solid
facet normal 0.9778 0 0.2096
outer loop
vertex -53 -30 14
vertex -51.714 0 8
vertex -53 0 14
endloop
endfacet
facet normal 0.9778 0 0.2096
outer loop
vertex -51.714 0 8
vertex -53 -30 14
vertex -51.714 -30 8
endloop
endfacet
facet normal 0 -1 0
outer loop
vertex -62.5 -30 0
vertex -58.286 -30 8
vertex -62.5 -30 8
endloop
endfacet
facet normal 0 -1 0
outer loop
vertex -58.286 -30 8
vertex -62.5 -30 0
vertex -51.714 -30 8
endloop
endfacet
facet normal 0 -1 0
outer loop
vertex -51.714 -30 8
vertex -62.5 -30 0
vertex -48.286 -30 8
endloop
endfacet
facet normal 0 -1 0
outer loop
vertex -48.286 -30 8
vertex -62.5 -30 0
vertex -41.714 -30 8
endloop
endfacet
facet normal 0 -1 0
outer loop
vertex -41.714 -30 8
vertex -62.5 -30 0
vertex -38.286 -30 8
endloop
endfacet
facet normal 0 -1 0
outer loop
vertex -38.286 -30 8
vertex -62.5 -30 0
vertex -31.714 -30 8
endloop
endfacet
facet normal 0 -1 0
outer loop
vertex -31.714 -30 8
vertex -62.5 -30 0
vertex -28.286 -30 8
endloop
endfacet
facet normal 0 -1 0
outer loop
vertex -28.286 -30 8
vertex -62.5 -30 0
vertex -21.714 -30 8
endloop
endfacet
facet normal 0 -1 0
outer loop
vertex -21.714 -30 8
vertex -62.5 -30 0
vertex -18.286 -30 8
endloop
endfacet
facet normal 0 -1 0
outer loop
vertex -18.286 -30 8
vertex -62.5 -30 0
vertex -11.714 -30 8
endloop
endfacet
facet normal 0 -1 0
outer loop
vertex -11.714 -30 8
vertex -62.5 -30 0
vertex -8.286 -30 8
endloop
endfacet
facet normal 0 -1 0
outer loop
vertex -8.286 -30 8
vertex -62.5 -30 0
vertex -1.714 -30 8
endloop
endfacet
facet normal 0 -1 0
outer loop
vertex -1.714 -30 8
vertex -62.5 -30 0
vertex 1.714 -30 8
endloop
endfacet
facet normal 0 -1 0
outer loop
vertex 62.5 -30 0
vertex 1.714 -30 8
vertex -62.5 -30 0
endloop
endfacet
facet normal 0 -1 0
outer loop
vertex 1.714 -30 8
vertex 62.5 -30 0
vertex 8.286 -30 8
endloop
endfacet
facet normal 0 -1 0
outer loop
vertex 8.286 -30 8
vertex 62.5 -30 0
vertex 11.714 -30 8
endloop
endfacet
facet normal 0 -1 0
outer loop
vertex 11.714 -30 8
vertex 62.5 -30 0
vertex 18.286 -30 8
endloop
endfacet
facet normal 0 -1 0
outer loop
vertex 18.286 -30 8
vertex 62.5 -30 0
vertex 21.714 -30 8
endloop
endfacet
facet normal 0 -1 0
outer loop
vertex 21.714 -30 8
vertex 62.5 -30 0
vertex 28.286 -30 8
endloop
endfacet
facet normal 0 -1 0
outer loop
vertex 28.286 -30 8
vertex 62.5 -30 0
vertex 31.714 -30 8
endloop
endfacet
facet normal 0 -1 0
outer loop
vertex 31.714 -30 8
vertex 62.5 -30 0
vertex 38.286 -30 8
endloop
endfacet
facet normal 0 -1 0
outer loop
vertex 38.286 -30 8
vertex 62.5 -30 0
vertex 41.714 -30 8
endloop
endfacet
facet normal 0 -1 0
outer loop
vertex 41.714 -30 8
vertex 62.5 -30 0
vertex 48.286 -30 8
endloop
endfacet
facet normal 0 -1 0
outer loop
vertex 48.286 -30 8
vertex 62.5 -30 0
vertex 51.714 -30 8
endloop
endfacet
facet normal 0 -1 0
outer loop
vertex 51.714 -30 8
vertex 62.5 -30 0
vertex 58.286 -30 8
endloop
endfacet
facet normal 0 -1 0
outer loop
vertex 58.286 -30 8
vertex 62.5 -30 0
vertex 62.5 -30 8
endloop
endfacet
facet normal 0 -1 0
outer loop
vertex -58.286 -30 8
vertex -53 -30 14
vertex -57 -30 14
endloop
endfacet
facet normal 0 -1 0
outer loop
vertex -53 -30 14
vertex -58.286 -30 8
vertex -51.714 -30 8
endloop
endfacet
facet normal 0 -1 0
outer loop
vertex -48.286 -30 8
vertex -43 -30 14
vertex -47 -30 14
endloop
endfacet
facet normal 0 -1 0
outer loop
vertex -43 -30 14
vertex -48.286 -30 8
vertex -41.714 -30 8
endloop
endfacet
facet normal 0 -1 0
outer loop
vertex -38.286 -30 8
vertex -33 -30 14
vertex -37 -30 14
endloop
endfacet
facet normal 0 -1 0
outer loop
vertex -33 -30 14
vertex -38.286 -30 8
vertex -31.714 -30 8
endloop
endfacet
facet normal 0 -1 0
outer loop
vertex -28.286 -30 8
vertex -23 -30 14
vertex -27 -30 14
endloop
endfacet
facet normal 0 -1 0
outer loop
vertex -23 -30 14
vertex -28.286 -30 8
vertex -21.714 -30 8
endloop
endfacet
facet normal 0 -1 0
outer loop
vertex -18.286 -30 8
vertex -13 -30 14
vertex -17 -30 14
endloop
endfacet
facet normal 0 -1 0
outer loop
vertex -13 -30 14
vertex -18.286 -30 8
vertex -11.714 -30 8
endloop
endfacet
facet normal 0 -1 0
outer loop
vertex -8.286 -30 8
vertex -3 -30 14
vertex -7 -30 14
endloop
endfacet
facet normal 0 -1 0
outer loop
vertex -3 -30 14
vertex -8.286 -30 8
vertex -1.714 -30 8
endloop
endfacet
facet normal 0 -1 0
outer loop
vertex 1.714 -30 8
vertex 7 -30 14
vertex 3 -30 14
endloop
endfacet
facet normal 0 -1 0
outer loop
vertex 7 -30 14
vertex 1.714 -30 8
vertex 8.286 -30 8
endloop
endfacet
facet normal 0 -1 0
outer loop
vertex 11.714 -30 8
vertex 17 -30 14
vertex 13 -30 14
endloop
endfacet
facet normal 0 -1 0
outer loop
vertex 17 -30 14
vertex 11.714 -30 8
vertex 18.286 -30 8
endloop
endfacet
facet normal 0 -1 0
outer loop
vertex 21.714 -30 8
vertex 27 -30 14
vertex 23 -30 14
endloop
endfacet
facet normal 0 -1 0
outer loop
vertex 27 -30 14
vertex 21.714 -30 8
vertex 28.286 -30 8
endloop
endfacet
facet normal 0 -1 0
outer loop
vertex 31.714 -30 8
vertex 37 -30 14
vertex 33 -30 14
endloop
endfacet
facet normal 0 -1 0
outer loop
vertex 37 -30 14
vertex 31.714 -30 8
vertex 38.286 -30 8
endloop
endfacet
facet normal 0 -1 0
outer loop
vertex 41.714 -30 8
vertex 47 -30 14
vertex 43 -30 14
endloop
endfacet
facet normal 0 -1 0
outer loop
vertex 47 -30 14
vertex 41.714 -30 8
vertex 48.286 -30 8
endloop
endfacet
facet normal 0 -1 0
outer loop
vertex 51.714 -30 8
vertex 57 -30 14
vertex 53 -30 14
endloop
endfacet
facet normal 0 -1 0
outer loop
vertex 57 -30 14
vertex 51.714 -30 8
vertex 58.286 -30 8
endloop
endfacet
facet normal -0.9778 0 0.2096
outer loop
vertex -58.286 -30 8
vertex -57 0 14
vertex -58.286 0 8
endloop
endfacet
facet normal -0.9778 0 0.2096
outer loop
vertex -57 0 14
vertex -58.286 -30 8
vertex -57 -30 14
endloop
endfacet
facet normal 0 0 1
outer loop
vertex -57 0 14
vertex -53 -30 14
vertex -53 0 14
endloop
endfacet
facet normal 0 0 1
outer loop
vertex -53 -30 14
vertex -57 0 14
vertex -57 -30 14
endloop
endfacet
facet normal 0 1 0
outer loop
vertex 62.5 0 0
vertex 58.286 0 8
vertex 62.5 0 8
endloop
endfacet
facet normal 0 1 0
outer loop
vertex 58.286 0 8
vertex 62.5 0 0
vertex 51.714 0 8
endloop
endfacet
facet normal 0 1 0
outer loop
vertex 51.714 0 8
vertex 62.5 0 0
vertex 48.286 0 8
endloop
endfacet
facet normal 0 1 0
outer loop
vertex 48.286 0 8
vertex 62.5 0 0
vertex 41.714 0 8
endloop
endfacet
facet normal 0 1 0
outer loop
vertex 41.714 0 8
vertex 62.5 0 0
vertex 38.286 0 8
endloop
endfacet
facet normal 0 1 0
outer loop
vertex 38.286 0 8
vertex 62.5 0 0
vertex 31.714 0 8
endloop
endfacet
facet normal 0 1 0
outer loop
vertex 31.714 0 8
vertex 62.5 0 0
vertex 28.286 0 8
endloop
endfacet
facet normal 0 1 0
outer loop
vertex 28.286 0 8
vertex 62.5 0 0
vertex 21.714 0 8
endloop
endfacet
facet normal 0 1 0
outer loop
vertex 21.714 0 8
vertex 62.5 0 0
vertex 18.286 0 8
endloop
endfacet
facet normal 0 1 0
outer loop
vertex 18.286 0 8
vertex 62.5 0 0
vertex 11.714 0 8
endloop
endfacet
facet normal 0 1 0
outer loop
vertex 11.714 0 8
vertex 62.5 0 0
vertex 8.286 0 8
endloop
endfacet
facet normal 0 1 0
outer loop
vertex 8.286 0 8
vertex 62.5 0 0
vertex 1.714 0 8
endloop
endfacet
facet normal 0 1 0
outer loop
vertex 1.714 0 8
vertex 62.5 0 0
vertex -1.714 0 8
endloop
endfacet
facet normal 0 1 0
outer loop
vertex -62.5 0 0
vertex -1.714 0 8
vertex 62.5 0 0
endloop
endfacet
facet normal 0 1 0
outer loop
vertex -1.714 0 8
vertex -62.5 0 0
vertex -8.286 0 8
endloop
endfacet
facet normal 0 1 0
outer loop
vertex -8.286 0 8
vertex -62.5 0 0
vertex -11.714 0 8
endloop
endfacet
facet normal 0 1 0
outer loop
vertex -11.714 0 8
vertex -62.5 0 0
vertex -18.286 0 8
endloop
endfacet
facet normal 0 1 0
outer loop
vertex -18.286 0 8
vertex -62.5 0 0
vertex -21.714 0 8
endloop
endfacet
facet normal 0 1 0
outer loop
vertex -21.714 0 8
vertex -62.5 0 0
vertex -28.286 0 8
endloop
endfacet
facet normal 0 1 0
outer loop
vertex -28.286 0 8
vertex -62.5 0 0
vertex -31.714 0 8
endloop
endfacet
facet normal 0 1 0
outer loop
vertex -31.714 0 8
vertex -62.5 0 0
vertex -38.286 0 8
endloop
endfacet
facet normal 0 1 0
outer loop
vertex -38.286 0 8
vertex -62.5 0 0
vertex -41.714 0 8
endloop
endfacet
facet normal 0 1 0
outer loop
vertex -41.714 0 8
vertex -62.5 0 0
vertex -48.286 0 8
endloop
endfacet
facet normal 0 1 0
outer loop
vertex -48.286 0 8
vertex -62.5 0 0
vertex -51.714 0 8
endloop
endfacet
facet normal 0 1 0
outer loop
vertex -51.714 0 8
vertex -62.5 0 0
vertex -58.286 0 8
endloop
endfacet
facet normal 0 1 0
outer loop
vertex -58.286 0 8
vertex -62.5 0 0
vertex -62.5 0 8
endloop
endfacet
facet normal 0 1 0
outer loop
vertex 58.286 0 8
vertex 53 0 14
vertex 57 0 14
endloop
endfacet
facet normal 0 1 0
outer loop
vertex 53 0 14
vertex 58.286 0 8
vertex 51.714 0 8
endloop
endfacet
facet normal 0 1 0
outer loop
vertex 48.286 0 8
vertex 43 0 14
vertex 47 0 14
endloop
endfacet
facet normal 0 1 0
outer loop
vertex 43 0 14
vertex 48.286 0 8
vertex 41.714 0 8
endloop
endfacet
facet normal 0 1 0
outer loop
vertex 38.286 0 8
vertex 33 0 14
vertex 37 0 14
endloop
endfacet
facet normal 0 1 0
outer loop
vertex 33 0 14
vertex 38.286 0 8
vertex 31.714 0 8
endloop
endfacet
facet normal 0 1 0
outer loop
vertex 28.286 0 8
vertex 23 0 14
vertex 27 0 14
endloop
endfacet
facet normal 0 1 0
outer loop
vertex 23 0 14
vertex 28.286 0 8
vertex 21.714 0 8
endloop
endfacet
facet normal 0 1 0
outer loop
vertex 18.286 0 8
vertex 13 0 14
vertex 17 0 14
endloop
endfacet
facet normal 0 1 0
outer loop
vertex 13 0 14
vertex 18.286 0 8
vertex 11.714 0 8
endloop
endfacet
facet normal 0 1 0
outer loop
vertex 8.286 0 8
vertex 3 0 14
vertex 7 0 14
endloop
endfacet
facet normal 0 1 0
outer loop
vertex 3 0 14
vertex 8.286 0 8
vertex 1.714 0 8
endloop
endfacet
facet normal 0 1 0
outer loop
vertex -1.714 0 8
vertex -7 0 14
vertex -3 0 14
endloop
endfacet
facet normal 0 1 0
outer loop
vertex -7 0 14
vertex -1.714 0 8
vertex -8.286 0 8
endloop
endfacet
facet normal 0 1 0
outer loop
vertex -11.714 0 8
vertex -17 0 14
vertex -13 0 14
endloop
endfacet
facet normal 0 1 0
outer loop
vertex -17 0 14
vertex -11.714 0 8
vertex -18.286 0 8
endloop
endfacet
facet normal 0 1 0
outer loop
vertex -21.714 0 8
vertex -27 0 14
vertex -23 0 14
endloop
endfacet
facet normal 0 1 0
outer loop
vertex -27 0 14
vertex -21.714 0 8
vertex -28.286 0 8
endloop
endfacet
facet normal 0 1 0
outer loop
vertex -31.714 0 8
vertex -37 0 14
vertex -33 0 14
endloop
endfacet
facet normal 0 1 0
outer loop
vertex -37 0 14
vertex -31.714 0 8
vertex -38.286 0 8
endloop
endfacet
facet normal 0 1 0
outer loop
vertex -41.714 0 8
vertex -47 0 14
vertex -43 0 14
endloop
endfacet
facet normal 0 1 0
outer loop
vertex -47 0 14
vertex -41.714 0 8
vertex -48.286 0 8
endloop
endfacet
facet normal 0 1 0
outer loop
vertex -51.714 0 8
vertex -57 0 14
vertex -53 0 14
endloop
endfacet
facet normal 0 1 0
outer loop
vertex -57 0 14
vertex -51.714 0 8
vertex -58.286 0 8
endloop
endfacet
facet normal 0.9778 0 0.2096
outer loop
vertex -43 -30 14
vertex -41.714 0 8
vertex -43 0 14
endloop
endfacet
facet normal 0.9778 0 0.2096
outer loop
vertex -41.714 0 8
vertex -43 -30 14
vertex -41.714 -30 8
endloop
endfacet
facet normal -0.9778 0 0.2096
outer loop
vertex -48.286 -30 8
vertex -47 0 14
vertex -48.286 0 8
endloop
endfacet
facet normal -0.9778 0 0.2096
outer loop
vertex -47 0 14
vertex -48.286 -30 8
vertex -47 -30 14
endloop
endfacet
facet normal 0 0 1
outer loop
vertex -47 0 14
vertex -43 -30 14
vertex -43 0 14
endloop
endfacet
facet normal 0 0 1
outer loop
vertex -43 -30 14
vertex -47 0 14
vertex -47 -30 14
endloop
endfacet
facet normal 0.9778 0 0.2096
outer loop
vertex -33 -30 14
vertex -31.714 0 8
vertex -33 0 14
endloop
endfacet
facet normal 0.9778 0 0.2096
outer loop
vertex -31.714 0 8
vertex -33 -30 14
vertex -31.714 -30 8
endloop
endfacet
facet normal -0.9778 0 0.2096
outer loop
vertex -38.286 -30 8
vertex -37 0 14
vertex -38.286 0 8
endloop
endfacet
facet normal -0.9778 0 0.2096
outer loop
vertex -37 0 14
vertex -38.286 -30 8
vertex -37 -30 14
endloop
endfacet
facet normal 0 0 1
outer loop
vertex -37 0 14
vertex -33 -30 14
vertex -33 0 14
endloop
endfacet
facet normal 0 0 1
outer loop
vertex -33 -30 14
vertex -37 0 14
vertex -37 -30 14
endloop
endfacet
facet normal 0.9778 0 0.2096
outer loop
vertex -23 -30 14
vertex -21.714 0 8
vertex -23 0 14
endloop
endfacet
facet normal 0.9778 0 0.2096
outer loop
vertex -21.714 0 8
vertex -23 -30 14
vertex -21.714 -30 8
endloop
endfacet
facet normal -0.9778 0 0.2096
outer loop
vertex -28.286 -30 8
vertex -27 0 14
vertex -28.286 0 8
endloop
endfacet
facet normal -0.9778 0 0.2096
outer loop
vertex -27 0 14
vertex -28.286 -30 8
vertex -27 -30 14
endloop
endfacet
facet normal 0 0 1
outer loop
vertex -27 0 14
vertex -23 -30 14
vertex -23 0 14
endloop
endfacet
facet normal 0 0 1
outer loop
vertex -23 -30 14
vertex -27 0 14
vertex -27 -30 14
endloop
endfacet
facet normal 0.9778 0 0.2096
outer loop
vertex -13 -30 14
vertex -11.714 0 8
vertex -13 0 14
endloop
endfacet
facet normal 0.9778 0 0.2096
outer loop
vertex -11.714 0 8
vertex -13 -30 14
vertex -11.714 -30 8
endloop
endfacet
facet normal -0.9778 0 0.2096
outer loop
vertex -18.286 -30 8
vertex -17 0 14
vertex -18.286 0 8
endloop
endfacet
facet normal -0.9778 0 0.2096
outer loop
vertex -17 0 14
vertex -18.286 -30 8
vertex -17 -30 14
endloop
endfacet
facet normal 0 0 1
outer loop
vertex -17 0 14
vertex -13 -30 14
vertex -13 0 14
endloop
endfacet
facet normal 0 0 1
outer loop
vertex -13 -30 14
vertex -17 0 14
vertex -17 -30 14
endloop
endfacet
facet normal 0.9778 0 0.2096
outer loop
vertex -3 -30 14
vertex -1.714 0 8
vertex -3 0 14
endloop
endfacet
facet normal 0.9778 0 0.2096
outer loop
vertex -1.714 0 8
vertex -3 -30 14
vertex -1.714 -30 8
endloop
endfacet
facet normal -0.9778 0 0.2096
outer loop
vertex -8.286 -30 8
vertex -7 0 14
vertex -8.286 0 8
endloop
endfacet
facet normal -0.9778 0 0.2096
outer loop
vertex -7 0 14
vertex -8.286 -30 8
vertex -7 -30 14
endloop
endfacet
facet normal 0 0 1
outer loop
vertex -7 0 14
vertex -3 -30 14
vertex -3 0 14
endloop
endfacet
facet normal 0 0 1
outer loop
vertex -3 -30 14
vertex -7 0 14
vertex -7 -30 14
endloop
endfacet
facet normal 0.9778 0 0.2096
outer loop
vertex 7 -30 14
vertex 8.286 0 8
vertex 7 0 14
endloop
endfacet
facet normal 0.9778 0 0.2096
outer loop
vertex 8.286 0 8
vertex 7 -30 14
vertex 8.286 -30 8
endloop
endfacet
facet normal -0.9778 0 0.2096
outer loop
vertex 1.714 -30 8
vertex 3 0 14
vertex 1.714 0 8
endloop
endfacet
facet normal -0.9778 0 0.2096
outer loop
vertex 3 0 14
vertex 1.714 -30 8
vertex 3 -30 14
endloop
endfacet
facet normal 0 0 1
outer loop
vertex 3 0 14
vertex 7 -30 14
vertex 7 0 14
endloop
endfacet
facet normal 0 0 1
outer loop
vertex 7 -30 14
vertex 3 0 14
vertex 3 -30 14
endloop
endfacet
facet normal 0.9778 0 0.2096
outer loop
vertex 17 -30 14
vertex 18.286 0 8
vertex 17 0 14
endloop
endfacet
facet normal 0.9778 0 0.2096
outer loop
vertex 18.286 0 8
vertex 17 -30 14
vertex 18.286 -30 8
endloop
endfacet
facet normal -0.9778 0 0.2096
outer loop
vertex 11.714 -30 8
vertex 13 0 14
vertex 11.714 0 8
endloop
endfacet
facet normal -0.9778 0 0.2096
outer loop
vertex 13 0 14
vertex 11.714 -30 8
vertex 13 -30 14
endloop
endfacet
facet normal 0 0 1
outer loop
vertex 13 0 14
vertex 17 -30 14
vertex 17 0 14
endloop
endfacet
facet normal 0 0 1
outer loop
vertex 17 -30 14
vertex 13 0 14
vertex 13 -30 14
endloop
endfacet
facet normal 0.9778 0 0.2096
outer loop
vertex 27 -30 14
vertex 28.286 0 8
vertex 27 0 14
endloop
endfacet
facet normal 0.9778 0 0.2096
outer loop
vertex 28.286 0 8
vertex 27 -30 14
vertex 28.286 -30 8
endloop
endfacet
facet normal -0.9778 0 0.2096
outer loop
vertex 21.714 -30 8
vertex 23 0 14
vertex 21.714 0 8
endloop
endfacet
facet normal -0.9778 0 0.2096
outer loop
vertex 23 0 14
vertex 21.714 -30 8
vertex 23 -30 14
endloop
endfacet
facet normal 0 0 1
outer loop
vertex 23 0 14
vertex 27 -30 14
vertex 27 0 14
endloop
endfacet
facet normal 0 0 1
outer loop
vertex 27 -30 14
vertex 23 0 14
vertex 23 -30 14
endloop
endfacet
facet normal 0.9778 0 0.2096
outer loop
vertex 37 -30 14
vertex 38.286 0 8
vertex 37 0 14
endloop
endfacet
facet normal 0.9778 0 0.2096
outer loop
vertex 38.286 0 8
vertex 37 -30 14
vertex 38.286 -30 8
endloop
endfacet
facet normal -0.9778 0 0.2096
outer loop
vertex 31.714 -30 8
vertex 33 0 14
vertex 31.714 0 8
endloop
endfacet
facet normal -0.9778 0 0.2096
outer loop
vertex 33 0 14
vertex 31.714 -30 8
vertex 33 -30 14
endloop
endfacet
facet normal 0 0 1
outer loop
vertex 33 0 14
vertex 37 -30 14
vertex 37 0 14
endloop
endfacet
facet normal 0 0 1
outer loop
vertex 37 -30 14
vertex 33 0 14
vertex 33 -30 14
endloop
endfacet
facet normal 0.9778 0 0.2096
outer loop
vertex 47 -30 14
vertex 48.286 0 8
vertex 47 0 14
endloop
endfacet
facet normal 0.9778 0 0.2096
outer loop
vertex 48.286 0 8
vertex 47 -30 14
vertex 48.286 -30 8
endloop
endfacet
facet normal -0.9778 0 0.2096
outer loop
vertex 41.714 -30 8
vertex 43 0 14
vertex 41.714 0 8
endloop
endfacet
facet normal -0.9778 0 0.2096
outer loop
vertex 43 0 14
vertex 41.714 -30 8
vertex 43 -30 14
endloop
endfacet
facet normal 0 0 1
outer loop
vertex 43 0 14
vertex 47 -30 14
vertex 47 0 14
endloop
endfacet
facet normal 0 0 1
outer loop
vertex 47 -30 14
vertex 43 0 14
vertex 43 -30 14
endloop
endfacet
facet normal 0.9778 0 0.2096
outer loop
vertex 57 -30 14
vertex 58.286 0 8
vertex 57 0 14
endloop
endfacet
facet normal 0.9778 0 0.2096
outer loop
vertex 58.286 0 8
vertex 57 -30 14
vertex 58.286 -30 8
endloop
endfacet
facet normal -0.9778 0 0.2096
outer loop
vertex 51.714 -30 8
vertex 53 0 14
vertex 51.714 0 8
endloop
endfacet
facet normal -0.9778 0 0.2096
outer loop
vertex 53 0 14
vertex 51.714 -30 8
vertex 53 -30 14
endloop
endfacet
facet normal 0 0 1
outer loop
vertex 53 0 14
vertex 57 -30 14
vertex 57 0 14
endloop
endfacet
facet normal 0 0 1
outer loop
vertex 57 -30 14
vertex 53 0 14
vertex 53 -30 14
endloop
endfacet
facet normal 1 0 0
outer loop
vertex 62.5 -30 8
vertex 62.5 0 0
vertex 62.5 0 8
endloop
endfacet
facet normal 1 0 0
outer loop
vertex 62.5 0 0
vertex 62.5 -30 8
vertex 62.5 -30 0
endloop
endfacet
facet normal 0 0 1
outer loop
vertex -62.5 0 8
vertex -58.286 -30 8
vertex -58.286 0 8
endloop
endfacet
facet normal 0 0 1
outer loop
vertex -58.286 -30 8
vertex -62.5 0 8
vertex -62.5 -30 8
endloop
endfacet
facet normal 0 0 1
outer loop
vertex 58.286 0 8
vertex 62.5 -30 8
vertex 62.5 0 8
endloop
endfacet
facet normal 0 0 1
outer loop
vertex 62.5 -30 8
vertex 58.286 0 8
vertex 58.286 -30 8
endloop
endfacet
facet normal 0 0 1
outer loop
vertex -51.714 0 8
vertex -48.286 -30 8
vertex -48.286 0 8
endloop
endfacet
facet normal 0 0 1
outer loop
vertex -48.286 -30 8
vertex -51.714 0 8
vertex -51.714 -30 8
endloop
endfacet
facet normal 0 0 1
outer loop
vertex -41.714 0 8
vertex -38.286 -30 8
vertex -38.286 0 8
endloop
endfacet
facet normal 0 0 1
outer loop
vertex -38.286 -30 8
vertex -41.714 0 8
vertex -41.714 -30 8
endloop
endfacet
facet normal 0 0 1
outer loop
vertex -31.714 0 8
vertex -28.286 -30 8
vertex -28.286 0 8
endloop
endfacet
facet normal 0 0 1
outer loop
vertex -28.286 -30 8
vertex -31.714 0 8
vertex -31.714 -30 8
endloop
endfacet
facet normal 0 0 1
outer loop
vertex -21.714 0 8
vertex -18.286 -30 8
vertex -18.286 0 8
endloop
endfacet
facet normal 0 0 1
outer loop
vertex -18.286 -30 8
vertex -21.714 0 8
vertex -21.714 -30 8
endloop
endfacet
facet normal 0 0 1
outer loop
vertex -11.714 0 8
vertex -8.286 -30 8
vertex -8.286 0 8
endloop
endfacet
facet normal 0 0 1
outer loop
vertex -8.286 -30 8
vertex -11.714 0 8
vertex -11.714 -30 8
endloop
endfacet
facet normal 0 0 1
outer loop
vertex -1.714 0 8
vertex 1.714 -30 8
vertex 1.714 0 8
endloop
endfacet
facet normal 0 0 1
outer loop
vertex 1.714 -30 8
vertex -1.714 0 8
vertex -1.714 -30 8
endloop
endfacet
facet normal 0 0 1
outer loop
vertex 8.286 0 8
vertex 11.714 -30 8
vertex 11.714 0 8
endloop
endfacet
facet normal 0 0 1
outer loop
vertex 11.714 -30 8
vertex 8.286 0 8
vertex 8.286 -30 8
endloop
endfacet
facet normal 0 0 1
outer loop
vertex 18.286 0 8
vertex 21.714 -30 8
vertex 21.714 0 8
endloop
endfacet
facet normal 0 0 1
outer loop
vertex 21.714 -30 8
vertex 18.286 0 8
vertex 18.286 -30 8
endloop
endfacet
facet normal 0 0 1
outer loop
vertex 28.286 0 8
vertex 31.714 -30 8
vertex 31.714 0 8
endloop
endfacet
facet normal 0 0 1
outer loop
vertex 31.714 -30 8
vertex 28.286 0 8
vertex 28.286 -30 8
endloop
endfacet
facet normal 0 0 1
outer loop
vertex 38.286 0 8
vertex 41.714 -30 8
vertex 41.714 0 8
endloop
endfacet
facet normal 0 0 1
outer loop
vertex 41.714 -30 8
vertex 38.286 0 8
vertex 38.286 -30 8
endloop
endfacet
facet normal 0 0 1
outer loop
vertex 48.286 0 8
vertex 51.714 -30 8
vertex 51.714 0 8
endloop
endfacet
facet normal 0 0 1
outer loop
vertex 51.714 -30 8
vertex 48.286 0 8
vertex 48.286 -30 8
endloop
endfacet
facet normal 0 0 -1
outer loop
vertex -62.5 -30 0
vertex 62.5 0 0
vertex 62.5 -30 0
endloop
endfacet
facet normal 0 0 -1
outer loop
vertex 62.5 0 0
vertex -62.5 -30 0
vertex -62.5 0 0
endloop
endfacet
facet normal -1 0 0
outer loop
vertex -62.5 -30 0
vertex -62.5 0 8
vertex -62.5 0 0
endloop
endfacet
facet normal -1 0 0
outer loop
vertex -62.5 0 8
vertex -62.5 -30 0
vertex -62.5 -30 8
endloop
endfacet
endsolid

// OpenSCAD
$fn = 32;

// ----------------------------------------------------------------------
// Toothed rack, 12 teeth
// 10 mm pitch, 6 mm teeth
// ----------------------------------------------------------------------

// --- parameters (mm) ---
bar_w = 30;   // bar width (Y)
bar_h = 8;    // bar height (Z)
teeth = 12;   // number of teeth
pitch = 10;   // tooth pitch
tooth_h = 6;  // tooth height above the bar
root_w = 7;   // tooth width at the root
crest_w = 4;  // tooth width at the crest

// --- derived feature positions (mm) ---
span = (teeth - 1) * pitch;  // = 110   distance between the outer teeth
bar_l = span + root_w + 8;   // = 125   bar length: teeth plus 4 mm at each end
tooth_x = -span / 2;         // = -55   X of the first tooth
height = bar_h + tooth_h;    // = 14   overall height
feature_centers = [
  [tooth_x + 0 * pitch, -bar_w / 2],
  [tooth_x + 1 * pitch, -bar_w / 2],
  [tooth_x + 2 * pitch, -bar_w / 2],
  [tooth_x + 3 * pitch, -bar_w / 2],
  [tooth_x + 4 * pitch, -bar_w / 2],
  [tooth_x + 5 * pitch, -bar_w / 2],
  [tooth_x + 6 * pitch, -bar_w / 2],
  [tooth_x + 7 * pitch, -bar_w / 2],
  [tooth_x + 8 * pitch, -bar_w / 2],
  [tooth_x + 9 * pitch, -bar_w / 2],
  [tooth_x + 10 * pitch, -bar_w / 2],
  [tooth_x + 11 * pitch, -bar_w / 2]
];   // tooth centre line, drives the tooth loop

// bar with a rack of teeth, one extruded trapezoium per centre
module rack_tooth() {
  linear_extrude(height = bar_w)
    polygon(points = [
      [0, 0],
      [root_w, 0],
      [root_w / 2 + crest_w / 2, tooth_h + 1],
      [root_w / 2 - crest_w / 2, tooth_h + 1]
    ]);
}

union() {
  translate([-bar_l / 2, -bar_w, 0]) cube([bar_l, bar_w, bar_h]);
  for (centre = feature_centers)
    translate([centre[0] - root_w / 2, 0, bar_h - 1]) rotate([90, 0, 0]) rack_tooth();
}
